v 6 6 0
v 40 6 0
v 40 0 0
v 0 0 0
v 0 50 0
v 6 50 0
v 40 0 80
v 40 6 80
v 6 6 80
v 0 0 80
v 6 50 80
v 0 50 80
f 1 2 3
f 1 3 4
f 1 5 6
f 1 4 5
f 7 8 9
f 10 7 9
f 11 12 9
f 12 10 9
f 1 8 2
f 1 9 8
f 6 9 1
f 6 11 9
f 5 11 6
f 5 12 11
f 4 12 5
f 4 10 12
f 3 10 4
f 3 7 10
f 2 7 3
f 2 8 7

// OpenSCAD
$fn = 32;

// ----------------------------------------------------------------------
// Structural section: angle 40 x 50 mm
// ----------------------------------------------------------------------

// --- parameters (mm) ---
sec_w = 40;               // leg width, X
sec_h = 50;               // leg height, Y
flange_t = 6;             // leg thickness
plate_t = 80;             // cut length, Z (extrusion height)

profile = [[0, 0], [40, 0], [40, 6], [6, 6], [6, 50], [0, 50]];  // primary outline, 6 points, counter clockwise

// --- the one profile operation ---
linear_extrude(height = plate_t) polygon(points = profile);
